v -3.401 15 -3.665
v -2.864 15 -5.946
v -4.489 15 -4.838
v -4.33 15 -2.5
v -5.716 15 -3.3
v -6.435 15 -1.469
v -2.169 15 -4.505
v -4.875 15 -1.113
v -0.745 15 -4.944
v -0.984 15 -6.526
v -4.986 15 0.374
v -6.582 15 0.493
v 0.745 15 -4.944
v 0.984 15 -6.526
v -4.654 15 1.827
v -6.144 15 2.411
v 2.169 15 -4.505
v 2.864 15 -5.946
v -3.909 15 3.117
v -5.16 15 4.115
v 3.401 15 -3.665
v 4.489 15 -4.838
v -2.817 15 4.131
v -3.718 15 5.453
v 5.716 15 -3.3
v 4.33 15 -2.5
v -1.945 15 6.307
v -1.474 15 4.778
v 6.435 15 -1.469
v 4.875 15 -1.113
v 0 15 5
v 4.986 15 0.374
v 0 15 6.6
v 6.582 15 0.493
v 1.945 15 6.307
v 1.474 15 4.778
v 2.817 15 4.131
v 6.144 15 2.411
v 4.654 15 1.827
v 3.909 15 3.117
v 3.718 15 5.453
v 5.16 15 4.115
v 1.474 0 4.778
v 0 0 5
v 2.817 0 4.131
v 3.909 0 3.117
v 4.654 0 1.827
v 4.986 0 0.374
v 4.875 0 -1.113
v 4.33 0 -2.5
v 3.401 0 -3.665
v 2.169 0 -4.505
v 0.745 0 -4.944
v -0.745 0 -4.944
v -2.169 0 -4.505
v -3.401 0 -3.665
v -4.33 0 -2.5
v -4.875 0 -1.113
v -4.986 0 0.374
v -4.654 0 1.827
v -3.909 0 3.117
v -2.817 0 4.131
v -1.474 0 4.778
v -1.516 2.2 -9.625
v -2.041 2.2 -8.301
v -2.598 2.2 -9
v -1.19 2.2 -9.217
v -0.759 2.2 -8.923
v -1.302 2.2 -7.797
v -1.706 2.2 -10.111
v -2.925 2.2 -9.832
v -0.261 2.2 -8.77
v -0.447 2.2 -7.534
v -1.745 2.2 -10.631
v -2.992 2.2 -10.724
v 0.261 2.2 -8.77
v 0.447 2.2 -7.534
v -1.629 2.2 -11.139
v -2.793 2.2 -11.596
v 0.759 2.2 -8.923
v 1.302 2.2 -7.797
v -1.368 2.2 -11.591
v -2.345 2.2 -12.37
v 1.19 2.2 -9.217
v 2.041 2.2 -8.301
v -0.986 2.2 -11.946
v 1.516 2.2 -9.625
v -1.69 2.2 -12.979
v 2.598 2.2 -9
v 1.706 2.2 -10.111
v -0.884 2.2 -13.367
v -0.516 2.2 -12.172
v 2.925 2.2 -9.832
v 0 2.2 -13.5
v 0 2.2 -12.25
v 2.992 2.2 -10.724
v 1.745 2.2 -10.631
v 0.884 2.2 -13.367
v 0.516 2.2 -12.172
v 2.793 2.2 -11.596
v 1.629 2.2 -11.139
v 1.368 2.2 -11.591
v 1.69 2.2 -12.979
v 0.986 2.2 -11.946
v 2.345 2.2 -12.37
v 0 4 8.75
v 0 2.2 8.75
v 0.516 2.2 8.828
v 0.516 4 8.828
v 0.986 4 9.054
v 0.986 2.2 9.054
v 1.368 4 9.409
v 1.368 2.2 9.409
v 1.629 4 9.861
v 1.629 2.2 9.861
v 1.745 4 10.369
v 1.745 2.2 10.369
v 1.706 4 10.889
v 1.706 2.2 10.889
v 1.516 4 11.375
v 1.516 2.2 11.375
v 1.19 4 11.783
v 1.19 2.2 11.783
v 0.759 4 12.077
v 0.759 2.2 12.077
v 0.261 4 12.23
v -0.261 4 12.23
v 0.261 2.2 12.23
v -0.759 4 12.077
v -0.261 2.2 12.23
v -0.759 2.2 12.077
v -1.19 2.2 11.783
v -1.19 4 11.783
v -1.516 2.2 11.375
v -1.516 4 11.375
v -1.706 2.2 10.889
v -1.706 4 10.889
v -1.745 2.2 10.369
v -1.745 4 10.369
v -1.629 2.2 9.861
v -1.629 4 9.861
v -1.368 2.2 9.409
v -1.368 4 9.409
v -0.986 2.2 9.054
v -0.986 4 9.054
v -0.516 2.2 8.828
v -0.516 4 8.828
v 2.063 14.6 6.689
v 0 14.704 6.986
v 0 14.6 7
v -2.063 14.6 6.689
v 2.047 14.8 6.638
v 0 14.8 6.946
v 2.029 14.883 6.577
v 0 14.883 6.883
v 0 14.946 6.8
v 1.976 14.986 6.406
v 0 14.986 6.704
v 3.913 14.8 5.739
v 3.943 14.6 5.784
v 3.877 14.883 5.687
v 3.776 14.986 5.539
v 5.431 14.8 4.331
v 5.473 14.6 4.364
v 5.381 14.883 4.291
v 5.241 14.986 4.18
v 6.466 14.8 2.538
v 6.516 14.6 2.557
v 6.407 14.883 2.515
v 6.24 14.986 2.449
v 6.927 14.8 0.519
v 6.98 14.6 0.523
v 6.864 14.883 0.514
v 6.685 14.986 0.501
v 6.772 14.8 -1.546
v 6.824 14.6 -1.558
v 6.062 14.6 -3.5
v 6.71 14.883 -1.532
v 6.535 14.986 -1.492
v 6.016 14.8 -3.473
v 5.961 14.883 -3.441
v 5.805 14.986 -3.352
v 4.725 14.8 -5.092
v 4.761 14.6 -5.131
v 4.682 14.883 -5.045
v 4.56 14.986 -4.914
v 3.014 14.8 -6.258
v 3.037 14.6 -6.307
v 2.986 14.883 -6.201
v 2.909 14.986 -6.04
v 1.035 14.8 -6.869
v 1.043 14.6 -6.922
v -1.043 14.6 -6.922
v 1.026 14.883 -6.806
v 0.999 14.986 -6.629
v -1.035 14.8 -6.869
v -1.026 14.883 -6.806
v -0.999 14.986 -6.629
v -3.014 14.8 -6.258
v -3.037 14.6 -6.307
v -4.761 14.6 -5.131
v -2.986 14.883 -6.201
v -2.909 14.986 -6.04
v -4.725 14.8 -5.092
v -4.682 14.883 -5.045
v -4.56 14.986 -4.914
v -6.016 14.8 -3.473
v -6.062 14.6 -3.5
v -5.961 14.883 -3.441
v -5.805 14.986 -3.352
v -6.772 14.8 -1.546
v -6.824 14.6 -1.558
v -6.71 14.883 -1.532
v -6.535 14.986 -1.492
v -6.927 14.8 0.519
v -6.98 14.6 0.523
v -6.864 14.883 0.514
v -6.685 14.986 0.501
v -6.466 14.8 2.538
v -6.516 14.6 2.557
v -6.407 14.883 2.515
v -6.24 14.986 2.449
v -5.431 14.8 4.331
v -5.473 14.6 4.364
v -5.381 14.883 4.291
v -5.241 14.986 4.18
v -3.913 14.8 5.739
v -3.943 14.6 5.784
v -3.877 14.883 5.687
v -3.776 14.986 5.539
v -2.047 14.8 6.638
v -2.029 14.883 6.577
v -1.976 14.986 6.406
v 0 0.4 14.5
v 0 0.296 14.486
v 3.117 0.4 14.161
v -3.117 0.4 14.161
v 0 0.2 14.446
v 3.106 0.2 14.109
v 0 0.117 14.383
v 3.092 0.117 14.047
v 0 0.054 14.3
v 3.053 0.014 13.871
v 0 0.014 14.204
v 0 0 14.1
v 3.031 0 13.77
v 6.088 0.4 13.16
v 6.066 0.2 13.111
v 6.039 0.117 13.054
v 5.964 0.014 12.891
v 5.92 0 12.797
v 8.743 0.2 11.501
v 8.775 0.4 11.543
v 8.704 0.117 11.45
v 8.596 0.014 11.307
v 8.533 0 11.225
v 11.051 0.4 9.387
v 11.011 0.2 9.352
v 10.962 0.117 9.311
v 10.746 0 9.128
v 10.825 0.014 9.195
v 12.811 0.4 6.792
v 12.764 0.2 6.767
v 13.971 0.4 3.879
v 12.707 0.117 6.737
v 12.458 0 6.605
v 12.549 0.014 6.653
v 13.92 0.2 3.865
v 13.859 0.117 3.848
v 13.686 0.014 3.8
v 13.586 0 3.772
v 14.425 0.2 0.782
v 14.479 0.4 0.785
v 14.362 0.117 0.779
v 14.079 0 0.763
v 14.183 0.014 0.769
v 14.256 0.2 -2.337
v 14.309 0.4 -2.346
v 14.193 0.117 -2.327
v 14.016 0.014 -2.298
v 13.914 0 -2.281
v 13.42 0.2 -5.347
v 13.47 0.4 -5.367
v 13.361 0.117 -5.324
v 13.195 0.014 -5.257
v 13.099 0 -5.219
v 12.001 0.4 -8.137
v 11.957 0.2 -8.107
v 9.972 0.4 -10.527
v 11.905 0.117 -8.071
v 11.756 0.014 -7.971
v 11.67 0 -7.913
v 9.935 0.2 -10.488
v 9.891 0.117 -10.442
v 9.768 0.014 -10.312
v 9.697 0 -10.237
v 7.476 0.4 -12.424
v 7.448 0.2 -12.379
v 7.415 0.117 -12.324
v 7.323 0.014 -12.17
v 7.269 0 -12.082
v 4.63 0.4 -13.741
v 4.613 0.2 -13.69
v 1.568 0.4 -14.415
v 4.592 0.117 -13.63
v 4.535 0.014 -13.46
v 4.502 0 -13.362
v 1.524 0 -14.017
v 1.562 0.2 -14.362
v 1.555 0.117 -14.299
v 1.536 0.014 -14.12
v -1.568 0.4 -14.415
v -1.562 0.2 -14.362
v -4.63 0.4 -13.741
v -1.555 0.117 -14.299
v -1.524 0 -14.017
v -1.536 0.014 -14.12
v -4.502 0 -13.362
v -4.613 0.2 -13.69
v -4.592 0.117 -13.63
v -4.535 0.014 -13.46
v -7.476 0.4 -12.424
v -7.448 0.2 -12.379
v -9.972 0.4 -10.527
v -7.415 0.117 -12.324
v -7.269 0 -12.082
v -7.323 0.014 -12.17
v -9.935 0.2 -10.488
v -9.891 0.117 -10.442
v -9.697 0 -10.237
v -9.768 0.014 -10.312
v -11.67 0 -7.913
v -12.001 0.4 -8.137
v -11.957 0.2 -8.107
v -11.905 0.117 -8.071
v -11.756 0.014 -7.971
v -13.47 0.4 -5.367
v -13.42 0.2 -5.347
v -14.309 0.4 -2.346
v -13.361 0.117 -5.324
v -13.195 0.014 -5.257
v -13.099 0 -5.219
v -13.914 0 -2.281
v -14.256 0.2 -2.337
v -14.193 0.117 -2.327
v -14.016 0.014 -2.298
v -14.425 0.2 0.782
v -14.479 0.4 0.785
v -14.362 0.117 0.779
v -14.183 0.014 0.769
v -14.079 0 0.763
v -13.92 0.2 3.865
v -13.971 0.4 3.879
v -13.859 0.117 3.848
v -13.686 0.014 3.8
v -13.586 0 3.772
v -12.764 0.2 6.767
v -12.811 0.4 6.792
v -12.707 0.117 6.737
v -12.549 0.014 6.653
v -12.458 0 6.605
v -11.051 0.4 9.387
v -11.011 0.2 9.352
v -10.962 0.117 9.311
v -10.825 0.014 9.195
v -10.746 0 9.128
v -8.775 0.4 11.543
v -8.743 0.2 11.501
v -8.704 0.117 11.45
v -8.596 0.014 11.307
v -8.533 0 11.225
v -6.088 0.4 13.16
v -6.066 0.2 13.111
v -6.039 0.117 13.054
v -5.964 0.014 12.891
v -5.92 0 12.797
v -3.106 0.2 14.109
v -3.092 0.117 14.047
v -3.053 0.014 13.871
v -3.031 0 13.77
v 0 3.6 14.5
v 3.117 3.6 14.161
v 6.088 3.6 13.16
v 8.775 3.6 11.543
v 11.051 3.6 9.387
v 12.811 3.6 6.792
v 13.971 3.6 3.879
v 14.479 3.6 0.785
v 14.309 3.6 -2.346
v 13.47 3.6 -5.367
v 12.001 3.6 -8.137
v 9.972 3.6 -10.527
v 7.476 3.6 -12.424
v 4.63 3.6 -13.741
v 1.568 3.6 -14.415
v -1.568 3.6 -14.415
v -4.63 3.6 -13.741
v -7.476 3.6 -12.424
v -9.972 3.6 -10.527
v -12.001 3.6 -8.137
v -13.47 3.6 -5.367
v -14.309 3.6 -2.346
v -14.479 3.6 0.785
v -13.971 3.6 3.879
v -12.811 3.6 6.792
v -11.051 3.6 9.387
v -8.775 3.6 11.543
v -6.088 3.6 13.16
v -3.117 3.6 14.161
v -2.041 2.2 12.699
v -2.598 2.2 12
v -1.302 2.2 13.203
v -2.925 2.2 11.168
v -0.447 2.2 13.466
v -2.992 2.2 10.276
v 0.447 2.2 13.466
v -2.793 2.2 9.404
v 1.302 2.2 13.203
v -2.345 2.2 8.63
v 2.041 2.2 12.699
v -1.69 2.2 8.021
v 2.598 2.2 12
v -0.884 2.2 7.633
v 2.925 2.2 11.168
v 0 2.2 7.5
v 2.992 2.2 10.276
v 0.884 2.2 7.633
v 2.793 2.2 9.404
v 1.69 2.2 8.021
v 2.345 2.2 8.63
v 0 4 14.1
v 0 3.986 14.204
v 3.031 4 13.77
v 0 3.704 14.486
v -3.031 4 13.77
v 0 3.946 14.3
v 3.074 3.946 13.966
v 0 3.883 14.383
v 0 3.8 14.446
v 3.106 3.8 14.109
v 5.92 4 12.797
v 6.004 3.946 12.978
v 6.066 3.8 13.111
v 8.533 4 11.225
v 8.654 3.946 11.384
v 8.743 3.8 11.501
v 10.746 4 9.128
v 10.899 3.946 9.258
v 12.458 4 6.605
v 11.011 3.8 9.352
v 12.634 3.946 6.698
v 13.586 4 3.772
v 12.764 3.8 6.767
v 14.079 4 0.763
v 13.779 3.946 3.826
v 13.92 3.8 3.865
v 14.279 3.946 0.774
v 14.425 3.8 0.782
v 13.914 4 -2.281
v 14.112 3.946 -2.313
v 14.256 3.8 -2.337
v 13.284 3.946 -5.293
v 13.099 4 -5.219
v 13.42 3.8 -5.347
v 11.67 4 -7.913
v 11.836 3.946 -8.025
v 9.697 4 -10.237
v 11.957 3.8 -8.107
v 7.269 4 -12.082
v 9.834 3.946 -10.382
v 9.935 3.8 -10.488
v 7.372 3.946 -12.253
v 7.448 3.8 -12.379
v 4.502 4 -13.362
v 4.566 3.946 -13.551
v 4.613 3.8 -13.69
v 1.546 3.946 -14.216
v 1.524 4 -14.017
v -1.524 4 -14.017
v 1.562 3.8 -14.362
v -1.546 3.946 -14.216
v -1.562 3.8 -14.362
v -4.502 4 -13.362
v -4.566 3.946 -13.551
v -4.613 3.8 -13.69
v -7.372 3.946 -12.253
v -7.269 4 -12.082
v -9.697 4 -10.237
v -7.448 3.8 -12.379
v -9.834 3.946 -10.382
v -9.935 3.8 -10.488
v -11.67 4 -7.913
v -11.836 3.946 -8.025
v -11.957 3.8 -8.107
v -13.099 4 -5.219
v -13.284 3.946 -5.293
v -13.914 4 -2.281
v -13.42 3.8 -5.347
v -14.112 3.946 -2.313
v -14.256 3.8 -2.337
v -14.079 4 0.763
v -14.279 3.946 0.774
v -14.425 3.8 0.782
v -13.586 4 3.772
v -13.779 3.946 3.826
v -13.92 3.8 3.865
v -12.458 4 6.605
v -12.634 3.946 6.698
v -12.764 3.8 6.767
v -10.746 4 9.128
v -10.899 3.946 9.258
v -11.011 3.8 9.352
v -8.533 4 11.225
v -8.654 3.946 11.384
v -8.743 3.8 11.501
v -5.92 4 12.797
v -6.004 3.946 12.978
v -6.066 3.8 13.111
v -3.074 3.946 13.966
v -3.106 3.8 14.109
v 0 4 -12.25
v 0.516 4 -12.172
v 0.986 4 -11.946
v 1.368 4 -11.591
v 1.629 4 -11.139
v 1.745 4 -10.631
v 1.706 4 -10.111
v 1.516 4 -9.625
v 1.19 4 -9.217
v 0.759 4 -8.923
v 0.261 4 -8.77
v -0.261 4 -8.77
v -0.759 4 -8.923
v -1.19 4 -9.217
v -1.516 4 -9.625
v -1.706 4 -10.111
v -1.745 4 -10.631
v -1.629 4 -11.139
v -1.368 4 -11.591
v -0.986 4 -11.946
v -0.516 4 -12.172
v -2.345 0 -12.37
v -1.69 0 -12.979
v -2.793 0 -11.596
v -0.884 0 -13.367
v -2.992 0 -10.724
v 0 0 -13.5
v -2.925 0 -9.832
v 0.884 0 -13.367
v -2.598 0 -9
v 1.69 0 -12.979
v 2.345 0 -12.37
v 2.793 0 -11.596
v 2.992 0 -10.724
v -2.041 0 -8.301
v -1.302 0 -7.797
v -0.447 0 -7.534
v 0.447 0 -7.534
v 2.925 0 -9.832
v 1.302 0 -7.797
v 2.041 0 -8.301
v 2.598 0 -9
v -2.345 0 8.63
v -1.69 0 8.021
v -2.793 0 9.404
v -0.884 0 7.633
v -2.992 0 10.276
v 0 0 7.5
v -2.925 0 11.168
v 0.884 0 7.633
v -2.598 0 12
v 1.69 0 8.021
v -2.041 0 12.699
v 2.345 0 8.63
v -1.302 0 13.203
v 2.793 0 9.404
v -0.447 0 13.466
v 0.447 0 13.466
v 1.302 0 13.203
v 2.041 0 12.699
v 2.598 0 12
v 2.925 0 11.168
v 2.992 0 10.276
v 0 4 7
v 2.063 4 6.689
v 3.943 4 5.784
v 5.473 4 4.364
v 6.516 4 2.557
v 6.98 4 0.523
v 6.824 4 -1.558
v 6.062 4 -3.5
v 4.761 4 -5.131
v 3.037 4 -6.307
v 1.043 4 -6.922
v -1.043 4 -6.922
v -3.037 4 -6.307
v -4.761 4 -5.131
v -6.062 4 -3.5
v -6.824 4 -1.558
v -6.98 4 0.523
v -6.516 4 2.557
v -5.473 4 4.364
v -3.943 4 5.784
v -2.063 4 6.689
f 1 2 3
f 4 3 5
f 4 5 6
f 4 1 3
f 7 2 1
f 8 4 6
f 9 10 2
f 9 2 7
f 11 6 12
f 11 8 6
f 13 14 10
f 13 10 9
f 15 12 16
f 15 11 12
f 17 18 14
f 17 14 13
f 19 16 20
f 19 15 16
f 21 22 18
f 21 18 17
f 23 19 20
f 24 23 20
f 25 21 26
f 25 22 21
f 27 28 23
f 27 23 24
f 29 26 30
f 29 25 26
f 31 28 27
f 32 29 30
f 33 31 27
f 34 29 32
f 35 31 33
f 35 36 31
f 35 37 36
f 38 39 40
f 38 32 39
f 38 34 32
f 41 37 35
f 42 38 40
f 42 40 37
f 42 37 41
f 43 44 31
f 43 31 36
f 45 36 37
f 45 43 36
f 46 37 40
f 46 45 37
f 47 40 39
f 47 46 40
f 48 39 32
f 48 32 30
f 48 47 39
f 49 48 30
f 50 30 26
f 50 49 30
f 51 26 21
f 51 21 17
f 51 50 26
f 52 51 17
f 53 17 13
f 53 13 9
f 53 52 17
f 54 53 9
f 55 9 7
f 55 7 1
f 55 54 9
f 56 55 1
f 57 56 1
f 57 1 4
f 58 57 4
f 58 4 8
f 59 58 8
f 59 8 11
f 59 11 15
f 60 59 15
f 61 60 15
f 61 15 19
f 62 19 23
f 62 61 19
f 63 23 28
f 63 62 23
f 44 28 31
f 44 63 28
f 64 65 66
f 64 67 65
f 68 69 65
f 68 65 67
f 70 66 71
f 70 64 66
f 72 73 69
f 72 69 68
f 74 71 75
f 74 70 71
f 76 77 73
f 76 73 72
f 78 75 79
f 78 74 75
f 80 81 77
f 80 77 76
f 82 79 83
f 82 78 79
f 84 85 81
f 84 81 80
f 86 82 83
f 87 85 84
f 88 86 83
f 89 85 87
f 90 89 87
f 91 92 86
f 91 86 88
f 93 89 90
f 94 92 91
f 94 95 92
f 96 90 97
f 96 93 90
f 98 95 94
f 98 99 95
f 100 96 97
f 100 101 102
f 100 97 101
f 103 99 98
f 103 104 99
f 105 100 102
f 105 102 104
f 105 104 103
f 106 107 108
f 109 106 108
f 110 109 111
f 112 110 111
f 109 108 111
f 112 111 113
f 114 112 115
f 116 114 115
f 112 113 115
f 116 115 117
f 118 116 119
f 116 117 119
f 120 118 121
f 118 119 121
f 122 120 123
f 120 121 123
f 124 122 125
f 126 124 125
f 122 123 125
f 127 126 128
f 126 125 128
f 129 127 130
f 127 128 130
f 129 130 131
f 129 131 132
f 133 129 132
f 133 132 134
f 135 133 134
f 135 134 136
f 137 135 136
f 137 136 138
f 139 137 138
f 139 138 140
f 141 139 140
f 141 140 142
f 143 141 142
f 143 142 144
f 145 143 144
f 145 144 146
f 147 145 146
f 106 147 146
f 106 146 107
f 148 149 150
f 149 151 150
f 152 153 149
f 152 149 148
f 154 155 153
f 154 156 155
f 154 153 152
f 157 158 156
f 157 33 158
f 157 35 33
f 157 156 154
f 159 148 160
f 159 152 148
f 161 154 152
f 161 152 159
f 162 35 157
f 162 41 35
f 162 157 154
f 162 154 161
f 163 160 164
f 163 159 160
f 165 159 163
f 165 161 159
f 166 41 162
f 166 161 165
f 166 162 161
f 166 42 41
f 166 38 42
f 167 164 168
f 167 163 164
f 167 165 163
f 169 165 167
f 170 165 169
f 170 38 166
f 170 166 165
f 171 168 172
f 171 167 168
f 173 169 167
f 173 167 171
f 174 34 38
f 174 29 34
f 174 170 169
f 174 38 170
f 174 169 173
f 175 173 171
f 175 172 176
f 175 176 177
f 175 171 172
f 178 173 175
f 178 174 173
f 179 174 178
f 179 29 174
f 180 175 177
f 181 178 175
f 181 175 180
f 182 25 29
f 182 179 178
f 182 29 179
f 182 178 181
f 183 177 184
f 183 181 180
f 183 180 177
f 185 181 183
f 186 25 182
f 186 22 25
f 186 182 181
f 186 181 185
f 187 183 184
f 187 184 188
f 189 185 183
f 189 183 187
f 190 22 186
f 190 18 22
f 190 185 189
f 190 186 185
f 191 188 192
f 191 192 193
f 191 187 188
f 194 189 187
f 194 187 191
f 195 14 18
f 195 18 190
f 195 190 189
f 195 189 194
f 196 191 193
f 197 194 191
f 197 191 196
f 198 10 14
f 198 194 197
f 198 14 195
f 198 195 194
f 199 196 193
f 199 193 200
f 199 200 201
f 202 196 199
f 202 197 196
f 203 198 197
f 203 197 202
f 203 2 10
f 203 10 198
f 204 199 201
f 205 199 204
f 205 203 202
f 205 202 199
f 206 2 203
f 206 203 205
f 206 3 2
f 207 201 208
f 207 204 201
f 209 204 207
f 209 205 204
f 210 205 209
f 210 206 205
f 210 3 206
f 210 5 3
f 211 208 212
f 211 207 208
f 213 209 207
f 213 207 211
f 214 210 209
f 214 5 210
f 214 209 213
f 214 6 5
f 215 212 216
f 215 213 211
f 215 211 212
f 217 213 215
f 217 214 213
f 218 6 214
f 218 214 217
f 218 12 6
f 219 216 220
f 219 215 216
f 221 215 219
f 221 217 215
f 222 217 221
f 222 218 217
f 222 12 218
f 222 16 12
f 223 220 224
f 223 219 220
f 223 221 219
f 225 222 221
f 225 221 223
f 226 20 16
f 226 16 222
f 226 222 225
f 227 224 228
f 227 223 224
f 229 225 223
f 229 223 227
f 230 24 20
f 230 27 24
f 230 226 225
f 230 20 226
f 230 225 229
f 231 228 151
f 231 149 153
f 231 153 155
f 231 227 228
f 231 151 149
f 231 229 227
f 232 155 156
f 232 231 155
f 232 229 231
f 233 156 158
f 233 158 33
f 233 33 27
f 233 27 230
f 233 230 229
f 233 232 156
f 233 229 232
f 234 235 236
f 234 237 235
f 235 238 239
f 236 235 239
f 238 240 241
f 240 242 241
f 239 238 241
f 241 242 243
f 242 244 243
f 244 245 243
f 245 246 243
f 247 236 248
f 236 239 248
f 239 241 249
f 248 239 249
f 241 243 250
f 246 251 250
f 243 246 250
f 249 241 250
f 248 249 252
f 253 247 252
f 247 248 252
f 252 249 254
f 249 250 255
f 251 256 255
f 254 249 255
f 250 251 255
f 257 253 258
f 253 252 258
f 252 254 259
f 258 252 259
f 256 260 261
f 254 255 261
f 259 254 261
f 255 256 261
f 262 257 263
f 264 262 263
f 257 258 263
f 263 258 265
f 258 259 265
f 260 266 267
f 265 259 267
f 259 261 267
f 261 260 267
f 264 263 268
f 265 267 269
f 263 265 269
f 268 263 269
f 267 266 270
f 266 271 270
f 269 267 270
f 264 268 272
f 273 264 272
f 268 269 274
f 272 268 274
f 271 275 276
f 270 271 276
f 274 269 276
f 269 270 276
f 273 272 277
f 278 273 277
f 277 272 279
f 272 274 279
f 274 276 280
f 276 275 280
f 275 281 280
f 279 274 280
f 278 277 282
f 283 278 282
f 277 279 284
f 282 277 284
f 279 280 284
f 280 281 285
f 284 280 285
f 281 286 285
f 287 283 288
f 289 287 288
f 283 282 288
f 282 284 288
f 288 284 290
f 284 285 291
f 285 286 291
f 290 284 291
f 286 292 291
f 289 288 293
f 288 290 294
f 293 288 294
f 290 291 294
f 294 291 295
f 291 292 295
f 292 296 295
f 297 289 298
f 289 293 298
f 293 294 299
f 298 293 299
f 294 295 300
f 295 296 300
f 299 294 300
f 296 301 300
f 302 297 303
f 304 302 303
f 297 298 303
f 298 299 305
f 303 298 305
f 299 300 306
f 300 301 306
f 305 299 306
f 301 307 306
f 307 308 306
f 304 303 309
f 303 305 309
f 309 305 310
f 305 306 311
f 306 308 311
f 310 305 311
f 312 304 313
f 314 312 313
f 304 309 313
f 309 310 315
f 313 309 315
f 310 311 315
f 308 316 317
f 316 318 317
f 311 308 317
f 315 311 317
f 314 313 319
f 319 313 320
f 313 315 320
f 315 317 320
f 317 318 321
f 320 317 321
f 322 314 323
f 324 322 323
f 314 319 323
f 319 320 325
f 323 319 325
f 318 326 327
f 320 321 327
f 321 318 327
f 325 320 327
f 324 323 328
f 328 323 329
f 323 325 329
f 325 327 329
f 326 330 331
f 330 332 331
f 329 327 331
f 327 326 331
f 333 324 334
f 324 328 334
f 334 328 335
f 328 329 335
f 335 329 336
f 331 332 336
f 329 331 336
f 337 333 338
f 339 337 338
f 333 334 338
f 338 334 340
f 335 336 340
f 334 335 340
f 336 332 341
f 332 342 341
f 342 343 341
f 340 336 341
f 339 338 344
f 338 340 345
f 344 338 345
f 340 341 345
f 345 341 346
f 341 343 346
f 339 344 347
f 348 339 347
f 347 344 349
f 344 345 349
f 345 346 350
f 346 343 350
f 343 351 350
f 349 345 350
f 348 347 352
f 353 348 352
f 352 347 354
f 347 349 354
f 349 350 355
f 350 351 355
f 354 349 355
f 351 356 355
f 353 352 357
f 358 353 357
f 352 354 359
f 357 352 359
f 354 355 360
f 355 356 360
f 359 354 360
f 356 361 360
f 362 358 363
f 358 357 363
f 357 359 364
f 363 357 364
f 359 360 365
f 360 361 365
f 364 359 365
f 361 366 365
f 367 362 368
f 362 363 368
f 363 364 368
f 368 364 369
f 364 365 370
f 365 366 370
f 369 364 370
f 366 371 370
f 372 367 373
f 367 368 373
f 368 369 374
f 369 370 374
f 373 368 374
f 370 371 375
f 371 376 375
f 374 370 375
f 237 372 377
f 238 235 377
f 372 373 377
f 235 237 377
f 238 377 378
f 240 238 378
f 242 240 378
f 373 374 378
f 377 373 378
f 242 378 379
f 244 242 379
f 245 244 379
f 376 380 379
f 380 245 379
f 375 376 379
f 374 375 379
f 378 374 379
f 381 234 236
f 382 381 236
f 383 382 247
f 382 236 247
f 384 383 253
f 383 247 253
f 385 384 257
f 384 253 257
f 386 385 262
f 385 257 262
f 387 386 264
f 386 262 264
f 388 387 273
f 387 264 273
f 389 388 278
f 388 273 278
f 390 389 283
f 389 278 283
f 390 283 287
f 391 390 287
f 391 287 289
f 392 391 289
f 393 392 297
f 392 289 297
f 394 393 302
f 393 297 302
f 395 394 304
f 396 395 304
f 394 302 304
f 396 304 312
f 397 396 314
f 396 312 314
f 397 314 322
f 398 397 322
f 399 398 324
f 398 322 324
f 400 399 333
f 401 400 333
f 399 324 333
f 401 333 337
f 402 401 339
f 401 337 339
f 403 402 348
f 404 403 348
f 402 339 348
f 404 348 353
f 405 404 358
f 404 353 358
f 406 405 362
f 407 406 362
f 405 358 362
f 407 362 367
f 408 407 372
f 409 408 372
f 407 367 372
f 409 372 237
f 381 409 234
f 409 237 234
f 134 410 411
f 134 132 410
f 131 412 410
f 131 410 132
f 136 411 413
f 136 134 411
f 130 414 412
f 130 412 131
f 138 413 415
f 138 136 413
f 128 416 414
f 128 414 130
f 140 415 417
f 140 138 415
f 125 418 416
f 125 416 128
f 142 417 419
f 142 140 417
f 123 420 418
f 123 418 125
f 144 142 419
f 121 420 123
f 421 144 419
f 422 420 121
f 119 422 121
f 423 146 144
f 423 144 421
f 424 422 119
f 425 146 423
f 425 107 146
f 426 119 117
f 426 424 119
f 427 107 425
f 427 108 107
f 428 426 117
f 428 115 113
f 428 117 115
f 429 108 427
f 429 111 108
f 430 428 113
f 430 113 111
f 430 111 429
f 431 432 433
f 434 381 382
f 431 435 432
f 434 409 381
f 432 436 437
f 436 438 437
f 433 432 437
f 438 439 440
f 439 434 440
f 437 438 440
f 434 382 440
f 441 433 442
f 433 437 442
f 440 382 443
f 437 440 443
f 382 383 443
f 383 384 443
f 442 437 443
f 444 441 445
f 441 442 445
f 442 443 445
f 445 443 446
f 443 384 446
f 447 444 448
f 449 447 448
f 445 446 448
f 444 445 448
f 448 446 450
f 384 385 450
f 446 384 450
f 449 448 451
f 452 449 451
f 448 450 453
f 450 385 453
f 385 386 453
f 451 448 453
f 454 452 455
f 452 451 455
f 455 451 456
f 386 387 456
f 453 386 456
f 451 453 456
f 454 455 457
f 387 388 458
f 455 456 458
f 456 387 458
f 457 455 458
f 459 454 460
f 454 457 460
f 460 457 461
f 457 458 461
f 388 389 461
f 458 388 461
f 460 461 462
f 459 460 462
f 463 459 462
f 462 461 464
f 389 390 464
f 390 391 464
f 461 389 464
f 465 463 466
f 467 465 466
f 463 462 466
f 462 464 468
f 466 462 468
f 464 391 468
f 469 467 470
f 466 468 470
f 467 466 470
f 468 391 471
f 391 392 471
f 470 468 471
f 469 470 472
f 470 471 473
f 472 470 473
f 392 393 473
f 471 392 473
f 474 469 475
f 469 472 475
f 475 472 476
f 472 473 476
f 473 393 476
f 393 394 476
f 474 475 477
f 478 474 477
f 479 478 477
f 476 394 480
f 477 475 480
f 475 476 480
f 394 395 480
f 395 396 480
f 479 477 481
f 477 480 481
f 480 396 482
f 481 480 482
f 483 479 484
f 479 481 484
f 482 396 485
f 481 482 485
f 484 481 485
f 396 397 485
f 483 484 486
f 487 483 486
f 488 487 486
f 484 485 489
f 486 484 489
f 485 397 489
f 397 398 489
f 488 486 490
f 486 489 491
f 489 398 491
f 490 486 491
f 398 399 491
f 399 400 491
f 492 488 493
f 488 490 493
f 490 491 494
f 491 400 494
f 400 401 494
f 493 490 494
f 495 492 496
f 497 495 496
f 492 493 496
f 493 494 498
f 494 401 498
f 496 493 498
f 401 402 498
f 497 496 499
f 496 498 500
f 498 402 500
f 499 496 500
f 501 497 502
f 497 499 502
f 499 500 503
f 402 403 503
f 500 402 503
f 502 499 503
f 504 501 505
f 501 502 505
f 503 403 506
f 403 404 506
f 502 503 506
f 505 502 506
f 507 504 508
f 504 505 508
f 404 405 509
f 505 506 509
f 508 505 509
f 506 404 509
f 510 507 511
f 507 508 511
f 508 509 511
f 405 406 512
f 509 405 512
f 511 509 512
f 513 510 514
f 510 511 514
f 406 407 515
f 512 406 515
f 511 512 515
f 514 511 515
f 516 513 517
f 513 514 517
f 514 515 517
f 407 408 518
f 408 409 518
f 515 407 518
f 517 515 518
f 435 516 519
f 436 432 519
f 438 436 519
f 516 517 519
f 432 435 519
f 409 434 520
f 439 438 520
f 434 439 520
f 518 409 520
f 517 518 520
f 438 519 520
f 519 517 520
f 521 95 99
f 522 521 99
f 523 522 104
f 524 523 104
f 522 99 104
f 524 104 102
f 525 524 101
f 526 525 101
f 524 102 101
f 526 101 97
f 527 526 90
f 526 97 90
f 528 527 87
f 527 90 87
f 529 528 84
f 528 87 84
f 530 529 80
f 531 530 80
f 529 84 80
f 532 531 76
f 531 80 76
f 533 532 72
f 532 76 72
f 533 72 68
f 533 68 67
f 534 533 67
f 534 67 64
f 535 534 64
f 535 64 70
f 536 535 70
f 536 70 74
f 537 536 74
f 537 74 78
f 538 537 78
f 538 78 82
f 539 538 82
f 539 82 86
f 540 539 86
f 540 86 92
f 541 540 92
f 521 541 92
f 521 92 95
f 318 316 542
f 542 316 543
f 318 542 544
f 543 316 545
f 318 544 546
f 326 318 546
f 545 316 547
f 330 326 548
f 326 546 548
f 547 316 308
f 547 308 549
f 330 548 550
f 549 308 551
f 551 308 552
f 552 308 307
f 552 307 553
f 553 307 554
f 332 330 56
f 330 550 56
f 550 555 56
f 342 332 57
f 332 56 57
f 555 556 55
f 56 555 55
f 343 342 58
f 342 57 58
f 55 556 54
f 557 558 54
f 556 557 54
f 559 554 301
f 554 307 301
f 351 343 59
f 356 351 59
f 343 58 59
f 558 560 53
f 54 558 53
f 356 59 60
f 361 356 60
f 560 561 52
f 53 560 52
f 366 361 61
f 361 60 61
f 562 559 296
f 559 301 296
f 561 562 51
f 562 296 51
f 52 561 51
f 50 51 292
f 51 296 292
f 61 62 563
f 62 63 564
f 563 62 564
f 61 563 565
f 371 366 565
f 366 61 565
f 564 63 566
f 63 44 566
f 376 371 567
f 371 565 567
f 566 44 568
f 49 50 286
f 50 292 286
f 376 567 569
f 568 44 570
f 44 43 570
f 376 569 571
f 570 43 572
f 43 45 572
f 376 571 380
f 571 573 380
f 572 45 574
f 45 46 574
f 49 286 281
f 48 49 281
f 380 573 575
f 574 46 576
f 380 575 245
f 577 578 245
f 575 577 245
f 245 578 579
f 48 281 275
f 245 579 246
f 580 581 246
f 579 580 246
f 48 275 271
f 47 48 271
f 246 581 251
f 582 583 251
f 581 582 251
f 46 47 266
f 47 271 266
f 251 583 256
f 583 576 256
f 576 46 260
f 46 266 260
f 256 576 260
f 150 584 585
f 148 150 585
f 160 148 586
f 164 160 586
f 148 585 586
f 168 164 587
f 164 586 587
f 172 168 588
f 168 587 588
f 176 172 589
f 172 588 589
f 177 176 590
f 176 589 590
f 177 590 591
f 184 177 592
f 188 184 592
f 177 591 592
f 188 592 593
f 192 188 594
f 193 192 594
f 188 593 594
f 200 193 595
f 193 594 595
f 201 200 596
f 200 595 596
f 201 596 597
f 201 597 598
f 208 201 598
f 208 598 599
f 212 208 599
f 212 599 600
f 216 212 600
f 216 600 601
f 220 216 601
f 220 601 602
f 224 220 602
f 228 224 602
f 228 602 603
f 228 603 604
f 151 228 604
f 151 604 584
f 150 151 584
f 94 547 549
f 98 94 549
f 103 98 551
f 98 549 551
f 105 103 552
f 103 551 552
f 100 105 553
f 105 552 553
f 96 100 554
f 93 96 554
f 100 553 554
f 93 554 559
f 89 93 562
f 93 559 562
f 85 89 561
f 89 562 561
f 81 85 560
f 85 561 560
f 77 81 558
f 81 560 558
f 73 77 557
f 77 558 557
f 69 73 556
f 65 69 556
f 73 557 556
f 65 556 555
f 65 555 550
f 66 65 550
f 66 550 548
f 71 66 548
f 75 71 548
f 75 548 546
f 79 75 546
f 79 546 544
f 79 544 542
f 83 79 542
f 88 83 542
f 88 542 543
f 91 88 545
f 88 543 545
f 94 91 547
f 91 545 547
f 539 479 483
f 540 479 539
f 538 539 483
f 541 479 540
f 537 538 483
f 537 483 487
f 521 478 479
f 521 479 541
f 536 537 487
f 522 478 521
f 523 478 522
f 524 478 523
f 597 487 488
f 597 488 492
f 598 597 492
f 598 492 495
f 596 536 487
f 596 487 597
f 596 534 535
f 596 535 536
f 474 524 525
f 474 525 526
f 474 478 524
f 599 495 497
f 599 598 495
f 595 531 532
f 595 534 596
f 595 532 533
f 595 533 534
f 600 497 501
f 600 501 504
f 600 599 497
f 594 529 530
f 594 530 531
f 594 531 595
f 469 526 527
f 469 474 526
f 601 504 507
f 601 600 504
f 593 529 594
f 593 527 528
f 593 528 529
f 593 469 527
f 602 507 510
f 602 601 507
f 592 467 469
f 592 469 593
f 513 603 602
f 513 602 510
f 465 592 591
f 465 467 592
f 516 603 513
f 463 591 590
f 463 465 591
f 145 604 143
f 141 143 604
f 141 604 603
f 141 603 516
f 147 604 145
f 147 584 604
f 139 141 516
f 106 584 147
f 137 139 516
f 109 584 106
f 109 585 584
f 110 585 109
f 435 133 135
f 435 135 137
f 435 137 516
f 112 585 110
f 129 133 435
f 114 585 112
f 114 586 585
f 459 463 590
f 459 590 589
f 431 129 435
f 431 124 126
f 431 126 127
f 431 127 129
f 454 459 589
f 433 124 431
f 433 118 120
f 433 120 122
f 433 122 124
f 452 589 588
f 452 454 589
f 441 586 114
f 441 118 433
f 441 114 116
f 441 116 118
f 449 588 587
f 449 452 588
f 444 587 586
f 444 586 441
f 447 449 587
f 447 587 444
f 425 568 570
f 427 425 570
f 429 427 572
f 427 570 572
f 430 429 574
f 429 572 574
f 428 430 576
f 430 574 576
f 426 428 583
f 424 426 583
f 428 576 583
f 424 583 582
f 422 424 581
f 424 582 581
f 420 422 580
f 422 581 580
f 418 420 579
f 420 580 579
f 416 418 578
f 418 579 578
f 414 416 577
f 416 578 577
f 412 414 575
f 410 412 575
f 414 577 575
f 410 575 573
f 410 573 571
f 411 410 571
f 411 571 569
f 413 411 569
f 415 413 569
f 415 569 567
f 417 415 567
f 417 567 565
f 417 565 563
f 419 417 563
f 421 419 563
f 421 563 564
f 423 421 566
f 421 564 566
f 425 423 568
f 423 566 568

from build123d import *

# Parameters (mm, degrees)
SKETCH_1_R          = 14.5
SKETCH_1_R_2        = 7
EXTRUDE_1_DEPTH     = 4
SKETCH_1_3_R        = 7
SKETCH_1_3_R_2      = 5
EXTRUDE_2_DEPTH     = 15
SKETCH_2_R          = 3
SKETCH_2_R_2        = 1.75
CUT_EXTRUDE_1_DEPTH = 2.2
SKETCH_2_4_R        = 1.75
CUT_EXTRUDE_2_DEPTH = 26.406692032
FILLET_1_R          = 0.4


with BuildPart() as part:
    # 草图1 → 凸台-拉伸1 (new body)
    with BuildSketch(Plane(origin=(0, 0, 0), x_dir=(1, 0, 0), z_dir=(0, 1, 0))):
        Circle(SKETCH_1_R)
        Circle(SKETCH_1_R_2, mode=Mode.SUBTRACT)
    extrude(amount=EXTRUDE_1_DEPTH)

    # 草图1<3> → 凸台-拉伸2 (add)
    with BuildSketch(Plane(origin=(0, 0, 0), x_dir=(1, 0, 0), z_dir=(0, 1, 0))):
        Circle(SKETCH_1_3_R)
        Circle(SKETCH_1_3_R_2, mode=Mode.SUBTRACT)
    extrude(amount=EXTRUDE_2_DEPTH)

    # 草图2 → 切除-拉伸1 (cut)
    # profile 1 of 2: a face of its own
    with BuildSketch(Plane.XZ):
        with Locations((0, 10.5)):
            Circle(SKETCH_2_R)
        with Locations((0, 10.5)):
            Circle(SKETCH_2_R_2, mode=Mode.SUBTRACT)
    # profile 2 of 2: a face of its own
    with BuildSketch(Plane.XZ):
        with Locations((0, -10.5)):
            Circle(SKETCH_2_R)
        with Locations((0, -10.5)):
            Circle(SKETCH_2_R_2, mode=Mode.SUBTRACT)
    extrude(amount=-CUT_EXTRUDE_1_DEPTH, mode=Mode.SUBTRACT)

    # 草图2<4> → 切除-拉伸2 (cut, through all)
    with BuildSketch(Plane.XZ):
        with Locations((0, 10.5)):
            Circle(SKETCH_2_4_R)
        with Locations((0, -10.5)):
            Circle(SKETCH_2_4_R)
    extrude(amount=-CUT_EXTRUDE_2_DEPTH, mode=Mode.SUBTRACT)

    # 圆角1
    fillet_1_edges = [part.edges().sort_by_distance(p)[0] for p in [
        (-14.5, 0, 0),
        (-14.5, 4, 0),
        (-7, 15, 0),
    ]]
    fillet(fillet_1_edges, radius=FILLET_1_R)


solid = part.part
